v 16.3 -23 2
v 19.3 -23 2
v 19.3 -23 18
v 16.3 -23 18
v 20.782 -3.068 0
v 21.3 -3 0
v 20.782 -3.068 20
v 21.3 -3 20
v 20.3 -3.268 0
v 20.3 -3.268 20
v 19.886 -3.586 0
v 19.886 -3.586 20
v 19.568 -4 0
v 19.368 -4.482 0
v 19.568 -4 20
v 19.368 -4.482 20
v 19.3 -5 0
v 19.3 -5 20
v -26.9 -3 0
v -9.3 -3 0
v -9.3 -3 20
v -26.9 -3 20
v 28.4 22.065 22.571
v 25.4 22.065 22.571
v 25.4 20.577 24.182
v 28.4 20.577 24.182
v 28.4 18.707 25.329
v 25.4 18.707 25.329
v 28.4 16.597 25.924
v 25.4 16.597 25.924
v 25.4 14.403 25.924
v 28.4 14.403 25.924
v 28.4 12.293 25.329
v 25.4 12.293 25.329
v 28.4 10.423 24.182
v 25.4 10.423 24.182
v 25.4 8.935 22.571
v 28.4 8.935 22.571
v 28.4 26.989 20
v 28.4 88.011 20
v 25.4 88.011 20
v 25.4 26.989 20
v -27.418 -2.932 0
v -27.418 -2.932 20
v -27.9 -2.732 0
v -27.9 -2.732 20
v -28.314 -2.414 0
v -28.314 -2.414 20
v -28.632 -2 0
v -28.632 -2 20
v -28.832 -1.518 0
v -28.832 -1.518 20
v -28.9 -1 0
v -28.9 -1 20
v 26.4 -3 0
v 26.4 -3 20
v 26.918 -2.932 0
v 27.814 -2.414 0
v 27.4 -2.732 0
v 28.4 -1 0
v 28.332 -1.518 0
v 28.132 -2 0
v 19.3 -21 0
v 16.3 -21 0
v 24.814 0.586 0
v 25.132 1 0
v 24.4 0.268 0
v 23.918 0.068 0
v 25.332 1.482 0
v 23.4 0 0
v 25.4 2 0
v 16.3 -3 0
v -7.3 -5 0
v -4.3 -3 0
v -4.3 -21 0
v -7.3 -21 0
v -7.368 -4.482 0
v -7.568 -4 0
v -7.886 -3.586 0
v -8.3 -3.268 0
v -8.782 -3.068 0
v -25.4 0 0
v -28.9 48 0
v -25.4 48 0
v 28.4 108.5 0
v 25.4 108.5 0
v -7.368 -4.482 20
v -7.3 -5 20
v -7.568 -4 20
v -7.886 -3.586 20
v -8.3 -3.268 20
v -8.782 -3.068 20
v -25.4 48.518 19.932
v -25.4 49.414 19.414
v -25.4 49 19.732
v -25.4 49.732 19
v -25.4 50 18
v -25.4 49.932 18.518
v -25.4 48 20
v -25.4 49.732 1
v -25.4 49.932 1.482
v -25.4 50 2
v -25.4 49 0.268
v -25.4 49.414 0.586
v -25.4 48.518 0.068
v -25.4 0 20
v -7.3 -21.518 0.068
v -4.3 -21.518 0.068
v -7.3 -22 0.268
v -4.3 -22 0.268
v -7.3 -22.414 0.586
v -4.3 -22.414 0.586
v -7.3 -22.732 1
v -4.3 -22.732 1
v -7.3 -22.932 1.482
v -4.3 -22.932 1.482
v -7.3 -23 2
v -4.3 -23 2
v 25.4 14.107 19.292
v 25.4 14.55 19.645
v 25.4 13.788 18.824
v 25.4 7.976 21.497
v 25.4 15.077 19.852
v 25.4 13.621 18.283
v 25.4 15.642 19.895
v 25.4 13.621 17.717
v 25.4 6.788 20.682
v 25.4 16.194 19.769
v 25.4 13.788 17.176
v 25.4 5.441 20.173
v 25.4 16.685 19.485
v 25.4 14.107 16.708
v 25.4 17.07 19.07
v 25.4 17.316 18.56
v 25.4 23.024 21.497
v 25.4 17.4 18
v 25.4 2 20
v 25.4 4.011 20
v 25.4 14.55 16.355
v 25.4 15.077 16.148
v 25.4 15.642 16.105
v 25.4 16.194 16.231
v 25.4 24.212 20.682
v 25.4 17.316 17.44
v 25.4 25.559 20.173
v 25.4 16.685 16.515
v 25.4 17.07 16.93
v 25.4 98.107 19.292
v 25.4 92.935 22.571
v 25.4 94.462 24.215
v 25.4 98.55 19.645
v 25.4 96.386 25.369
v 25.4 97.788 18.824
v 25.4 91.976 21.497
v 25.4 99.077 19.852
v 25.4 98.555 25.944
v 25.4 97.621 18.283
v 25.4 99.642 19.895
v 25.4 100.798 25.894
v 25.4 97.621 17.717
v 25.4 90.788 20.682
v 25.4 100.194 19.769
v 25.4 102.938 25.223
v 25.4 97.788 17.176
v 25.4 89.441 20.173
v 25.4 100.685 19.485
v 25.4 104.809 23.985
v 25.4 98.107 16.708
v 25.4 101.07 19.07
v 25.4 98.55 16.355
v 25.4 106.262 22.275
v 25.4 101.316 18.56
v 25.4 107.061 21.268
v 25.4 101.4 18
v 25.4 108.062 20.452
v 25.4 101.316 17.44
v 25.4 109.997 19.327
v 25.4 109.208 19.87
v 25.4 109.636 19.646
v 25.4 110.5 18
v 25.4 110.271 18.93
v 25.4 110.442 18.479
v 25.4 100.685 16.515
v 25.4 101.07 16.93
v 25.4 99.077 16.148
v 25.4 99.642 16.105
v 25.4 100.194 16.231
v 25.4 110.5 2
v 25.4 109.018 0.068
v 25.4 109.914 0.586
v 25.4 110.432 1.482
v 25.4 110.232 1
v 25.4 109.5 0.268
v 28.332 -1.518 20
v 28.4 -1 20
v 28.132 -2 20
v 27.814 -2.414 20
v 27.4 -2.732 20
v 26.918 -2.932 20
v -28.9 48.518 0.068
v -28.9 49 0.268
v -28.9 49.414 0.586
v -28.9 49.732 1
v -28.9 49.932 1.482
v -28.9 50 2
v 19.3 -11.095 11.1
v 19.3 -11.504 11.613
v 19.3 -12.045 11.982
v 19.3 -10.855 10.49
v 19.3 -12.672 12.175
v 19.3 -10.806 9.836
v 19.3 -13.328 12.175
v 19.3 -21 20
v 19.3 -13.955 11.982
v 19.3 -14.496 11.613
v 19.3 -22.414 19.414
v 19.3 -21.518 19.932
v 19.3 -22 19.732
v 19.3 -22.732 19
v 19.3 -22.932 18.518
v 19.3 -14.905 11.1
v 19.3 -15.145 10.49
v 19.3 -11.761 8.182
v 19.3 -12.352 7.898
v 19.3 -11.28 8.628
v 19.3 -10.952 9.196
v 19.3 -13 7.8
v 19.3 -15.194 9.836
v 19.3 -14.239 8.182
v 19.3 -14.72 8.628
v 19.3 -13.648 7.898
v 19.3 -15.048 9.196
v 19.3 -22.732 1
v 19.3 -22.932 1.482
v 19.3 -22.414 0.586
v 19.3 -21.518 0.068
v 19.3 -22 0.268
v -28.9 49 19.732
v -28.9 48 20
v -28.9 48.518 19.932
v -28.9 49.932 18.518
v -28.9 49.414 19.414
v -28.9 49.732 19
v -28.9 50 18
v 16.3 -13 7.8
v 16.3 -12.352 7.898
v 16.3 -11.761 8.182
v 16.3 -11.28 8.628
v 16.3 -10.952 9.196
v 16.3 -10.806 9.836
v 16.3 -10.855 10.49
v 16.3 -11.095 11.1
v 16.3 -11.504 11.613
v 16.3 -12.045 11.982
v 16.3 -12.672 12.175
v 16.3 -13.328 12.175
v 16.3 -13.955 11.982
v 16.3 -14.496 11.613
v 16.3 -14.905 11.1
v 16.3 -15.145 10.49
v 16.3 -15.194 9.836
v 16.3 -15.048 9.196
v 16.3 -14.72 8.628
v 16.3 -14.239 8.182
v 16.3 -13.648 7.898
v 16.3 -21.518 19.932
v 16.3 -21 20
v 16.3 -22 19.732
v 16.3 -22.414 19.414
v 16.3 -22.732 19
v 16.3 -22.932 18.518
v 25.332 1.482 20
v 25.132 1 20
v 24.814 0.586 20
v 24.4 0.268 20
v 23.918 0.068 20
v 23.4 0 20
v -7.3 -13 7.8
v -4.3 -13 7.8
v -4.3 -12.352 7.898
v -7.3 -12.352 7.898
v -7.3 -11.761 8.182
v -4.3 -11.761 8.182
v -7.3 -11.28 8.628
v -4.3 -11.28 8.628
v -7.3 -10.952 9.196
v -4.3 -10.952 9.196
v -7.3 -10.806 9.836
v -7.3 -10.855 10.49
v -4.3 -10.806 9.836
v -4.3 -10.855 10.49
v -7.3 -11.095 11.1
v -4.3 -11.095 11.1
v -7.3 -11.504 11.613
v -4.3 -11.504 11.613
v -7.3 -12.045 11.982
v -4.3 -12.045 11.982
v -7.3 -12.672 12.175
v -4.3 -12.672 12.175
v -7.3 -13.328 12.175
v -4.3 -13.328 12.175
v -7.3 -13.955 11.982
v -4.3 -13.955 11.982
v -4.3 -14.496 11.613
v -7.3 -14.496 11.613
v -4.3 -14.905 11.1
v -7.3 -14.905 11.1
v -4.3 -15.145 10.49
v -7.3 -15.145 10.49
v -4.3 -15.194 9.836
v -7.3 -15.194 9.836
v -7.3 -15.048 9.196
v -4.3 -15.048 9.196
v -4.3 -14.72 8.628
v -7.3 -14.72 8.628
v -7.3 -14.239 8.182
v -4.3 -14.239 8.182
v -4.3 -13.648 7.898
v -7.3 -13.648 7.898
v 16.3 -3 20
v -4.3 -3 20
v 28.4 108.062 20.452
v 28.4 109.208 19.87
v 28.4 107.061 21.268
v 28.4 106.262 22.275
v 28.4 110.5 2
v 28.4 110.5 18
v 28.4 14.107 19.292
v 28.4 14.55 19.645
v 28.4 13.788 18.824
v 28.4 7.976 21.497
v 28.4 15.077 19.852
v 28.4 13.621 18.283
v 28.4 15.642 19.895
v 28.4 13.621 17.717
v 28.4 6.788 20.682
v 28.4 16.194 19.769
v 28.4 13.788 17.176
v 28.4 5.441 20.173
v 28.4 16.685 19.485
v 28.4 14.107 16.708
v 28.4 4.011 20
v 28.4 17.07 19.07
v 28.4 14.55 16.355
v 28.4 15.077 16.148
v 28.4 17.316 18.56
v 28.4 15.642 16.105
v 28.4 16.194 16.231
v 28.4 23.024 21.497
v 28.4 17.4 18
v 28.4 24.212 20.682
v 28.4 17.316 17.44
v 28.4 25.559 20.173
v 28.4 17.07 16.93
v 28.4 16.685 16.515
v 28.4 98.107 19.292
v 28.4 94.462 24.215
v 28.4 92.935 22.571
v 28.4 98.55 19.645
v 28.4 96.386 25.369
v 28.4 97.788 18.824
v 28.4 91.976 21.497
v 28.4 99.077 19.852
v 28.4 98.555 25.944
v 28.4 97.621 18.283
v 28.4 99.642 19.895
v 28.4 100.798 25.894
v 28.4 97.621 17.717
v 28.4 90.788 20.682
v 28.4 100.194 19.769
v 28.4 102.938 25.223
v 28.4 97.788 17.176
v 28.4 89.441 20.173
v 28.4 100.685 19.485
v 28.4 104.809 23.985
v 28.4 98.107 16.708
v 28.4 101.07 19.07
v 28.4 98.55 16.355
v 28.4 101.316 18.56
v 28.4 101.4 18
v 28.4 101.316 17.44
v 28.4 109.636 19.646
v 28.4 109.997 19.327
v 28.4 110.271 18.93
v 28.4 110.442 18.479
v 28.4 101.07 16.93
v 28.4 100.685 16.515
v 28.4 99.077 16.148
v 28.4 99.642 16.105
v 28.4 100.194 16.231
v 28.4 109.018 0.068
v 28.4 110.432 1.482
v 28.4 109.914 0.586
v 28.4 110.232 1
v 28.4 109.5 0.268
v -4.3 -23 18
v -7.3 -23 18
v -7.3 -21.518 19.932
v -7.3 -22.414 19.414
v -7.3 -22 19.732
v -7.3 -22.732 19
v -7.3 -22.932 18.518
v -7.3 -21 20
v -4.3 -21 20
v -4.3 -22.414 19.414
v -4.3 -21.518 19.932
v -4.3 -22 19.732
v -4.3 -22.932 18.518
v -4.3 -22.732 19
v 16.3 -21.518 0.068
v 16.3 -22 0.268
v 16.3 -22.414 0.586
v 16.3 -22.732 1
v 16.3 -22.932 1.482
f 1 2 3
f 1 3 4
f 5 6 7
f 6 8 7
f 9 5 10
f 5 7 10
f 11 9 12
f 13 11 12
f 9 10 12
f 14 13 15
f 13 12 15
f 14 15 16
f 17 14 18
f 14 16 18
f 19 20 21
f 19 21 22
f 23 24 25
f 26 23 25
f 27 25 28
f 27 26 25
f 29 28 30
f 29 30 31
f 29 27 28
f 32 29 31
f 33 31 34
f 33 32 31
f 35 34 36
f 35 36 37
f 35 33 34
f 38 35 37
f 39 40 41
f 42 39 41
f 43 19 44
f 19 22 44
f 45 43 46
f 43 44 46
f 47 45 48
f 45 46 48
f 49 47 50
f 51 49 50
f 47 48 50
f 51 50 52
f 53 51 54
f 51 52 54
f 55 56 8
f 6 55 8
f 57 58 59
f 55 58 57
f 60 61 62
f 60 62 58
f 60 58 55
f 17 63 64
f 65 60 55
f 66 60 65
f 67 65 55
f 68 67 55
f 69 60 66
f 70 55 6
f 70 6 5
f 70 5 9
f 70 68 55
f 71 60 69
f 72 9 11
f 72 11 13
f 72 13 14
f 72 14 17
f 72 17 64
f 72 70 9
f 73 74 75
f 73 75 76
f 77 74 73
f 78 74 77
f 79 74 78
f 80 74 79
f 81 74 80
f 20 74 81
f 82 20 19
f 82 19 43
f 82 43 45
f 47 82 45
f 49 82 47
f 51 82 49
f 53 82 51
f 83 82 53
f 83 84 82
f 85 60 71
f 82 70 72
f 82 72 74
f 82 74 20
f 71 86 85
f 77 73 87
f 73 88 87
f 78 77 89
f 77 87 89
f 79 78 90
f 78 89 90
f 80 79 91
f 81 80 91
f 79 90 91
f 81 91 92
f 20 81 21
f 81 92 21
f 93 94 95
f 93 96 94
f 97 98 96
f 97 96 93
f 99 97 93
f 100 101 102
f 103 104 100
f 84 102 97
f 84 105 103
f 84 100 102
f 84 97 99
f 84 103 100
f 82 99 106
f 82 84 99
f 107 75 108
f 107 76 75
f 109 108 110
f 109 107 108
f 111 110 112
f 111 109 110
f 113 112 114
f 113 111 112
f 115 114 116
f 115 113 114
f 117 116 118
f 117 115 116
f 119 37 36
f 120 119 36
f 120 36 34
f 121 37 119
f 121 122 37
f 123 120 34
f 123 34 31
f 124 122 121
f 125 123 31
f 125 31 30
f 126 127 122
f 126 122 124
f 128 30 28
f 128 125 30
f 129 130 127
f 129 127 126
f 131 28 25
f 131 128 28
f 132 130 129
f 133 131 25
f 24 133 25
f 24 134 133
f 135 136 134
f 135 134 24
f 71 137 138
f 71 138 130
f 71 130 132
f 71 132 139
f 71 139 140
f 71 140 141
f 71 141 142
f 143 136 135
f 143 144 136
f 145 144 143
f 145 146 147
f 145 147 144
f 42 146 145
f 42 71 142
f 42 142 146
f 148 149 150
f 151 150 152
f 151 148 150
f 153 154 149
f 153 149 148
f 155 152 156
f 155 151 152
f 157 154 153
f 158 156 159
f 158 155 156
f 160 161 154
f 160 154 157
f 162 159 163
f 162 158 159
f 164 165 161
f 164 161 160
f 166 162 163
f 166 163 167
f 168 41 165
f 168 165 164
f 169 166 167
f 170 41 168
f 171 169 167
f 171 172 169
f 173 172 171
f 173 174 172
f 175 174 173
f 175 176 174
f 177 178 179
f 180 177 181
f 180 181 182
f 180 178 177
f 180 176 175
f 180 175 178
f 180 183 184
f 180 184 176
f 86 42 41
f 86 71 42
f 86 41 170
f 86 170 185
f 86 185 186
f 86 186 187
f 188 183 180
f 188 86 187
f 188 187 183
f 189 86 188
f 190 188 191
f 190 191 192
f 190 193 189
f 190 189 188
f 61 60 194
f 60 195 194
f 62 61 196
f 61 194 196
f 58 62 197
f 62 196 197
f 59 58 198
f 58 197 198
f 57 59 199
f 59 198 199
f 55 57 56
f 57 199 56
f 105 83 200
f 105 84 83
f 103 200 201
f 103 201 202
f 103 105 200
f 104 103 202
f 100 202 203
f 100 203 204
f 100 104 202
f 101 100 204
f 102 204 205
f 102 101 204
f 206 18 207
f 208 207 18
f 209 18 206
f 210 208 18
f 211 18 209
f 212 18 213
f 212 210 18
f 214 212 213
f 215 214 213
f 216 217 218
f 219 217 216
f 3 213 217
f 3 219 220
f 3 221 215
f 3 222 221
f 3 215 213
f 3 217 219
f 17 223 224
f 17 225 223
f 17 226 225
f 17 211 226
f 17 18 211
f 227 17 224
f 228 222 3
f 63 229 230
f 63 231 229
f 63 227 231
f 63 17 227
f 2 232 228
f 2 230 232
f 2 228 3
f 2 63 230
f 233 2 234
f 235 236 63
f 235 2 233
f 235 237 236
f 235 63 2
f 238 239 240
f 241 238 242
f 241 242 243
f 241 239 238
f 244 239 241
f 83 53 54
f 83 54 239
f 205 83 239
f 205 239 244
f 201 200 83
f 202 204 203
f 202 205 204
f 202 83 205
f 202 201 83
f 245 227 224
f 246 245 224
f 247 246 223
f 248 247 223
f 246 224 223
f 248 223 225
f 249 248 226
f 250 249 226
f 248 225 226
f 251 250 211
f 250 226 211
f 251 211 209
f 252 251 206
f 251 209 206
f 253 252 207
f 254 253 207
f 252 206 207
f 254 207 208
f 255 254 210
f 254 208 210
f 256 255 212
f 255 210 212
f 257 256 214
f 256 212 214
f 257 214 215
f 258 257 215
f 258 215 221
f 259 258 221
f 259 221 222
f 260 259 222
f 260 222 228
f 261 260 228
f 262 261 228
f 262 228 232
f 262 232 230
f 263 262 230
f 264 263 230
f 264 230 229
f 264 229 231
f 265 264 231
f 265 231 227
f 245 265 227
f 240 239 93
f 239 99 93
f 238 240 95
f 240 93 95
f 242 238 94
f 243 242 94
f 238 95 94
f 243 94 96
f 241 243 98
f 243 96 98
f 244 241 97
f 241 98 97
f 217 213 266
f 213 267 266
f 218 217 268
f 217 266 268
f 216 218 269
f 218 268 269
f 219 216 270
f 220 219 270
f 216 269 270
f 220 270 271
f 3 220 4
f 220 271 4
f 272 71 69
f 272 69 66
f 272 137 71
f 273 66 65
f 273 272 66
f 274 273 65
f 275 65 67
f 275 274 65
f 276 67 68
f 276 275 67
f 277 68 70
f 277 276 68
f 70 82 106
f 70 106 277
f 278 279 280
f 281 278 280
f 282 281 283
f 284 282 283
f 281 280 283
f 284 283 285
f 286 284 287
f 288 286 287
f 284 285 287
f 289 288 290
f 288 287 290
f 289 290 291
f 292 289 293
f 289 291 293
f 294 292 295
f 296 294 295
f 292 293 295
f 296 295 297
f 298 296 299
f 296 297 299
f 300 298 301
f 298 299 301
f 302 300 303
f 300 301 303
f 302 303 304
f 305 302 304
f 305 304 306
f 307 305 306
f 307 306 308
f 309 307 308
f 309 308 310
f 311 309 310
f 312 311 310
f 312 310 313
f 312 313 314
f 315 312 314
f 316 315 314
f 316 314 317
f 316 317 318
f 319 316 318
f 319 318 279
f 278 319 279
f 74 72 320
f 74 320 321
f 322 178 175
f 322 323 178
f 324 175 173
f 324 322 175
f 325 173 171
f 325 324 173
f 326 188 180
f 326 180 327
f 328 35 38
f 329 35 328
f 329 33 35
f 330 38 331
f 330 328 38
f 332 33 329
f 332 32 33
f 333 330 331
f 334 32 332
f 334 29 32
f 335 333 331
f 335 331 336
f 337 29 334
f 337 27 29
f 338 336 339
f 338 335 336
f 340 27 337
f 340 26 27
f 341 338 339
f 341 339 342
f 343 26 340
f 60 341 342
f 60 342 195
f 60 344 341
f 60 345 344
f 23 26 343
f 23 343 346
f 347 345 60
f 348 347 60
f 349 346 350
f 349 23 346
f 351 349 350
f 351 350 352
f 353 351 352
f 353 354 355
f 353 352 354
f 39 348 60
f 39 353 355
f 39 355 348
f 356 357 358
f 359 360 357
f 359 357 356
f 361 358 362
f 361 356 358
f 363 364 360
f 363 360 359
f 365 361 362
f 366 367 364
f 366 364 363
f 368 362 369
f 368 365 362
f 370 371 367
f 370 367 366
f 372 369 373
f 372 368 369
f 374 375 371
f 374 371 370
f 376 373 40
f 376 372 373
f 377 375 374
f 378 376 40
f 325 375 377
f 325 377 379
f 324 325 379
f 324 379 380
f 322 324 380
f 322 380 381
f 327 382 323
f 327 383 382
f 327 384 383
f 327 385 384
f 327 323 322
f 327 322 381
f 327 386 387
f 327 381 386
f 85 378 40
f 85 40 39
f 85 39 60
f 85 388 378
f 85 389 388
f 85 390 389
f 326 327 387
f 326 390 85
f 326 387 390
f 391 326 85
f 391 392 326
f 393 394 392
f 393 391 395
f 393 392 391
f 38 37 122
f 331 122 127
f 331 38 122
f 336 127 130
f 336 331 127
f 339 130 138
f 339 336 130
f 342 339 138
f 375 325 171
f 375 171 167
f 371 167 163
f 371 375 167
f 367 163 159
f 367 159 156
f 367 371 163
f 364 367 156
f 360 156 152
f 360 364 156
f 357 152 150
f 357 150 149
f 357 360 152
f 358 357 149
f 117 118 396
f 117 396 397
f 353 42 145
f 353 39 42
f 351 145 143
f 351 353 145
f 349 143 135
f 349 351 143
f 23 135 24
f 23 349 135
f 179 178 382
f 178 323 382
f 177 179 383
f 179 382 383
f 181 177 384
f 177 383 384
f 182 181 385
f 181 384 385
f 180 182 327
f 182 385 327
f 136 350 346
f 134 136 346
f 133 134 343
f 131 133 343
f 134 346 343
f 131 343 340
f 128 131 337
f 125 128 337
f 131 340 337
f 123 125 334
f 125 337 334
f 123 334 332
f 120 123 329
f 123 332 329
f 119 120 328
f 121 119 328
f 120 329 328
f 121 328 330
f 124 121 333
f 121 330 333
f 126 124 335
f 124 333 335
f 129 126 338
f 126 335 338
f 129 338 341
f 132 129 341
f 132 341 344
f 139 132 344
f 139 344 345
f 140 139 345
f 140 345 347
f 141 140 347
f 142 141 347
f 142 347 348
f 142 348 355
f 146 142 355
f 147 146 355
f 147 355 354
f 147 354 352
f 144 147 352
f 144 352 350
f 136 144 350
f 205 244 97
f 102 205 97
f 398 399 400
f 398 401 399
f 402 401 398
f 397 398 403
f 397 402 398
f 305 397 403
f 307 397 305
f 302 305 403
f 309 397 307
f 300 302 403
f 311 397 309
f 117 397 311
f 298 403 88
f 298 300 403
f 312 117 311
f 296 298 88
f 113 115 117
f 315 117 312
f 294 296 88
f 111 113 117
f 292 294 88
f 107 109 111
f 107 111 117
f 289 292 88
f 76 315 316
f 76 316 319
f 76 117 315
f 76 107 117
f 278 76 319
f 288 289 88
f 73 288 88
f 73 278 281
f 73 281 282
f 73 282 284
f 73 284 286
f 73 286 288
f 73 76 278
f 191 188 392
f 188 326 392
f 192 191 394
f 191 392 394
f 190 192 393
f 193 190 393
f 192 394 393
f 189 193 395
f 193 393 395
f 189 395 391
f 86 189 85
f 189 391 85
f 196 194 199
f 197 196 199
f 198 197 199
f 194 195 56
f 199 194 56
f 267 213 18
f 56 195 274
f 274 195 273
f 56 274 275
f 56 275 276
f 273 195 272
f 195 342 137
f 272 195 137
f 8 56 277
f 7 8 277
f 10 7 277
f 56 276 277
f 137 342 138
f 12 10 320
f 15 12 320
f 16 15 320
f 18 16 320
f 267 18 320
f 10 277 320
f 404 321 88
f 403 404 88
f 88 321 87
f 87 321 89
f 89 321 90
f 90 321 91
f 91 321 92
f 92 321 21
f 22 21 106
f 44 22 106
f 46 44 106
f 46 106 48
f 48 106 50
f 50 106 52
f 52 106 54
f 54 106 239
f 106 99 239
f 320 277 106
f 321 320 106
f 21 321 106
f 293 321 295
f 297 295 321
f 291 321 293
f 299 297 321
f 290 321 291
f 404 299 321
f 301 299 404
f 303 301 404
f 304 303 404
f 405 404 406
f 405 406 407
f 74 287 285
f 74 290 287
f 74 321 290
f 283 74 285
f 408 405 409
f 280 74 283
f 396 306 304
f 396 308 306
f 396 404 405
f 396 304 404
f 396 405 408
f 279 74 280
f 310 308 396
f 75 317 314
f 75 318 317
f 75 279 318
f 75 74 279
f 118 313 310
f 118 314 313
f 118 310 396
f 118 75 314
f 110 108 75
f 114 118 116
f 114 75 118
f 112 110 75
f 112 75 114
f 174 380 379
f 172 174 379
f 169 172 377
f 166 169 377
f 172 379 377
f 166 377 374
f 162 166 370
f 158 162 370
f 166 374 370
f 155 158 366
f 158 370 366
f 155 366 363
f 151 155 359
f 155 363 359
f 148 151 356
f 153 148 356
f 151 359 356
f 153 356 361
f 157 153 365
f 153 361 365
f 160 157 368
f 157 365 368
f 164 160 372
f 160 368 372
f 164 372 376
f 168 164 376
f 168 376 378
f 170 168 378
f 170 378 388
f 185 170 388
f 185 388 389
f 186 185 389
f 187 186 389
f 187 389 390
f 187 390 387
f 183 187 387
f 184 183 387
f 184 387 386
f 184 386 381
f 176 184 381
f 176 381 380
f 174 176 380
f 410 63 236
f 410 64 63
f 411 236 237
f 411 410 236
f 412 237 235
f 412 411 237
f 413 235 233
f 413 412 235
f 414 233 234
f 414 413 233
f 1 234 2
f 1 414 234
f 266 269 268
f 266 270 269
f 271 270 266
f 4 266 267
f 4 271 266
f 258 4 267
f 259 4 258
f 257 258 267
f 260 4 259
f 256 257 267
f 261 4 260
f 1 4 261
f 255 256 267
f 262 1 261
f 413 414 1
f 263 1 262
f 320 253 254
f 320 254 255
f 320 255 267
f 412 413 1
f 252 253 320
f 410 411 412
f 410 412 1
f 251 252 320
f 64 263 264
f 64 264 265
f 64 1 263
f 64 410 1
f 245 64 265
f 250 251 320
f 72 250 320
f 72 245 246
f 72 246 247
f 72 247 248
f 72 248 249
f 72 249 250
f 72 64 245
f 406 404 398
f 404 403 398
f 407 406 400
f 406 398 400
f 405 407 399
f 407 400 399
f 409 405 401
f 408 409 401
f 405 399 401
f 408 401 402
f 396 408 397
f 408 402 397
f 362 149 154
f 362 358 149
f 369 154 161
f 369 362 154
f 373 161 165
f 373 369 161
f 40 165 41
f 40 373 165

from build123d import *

# Parameters (mm, degrees)
BOSS_EXTRUDE1_DEPTH = 20
SKETCH2_R           = 2.2
CUT_EXTRUDE1_DEPTH  = 123.202659546
SKETCH3_R           = 8
BOSS_EXTRUDE2_DEPTH = 3
CUT_EXTRUDE2_REACH  = 129.16
SKETCH4_R           = 1.9
FILLET1_R           = 2
FILLET2_R           = 6


with BuildPart() as part:
    # Sketch1 → Boss-Extrude1 (new body)
    with BuildSketch(Plane.XY):
        Polygon((-25.4, 0), (25.4, 0), (25.4, 110.5), (28.4, 110.5), (28.4, -3), (19.3, -3), (19.3, -23), (16.3, -23), (16.3, -3), (-4.3, -3), (-4.3, -23), (-7.3, -23), (-7.3, -3), (-28.9, -3), (-28.9, 50), (-25.4, 50), align=None)
    extrude(amount=BOSS_EXTRUDE1_DEPTH)

    # Sketch2 → Cut-Extrude1 (cut, through all)
    with BuildSketch(Plane(origin=(19.3, 0, 0), x_dir=(0, 0, -1), z_dir=(1, 0, 0))):
        with Locations((-10, -13)):
            Circle(SKETCH2_R)
    extrude(amount=-CUT_EXTRUDE1_DEPTH, mode=Mode.SUBTRACT)

    # Sketch3 → Boss-Extrude2 (add)
    with BuildSketch(Plane(origin=(28.4, 0, 0), x_dir=(0, 0, -1), z_dir=(1, 0, 0))):
        with Locations((-18, 99.5)):
            Circle(SKETCH3_R)
        with Locations((-18, 15.5)):
            Circle(SKETCH3_R)
    extrude(amount=-BOSS_EXTRUDE2_DEPTH)

    # Sketch4 → Cut-Extrude2 (cut, up to next)
    with BuildSketch(Plane(origin=(28.4, 0, 0), x_dir=(0, 0, -1), z_dir=(1, 0, 0)), mode=Mode.PRIVATE) as cut_extrude2_sk1:
        with Locations(Location((-18, 99.5, 0), (0, 0, 90))):
            Circle(SKETCH4_R)
    cut_extrude2_tool1 = extrude(cut_extrude2_sk1.sketch, amount=-CUT_EXTRUDE2_REACH, mode=Mode.PRIVATE) & part.part
    # Sketch4 → Cut-Extrude2 (cut, up to next)
    with BuildSketch(Plane(origin=(28.4, 0, 0), x_dir=(0, 0, -1), z_dir=(1, 0, 0)), mode=Mode.PRIVATE) as cut_extrude2_sk2:
        with Locations(Location((-18, 15.5, 0), (0, 0, 90))):
            Circle(SKETCH4_R)
    cut_extrude2_tool2 = extrude(cut_extrude2_sk2.sketch, amount=-CUT_EXTRUDE2_REACH, mode=Mode.PRIVATE) & part.part
    add(cut_extrude2_tool1.solids().sort_by_distance((28.4, 99.5, 18))[0], mode=Mode.SUBTRACT)
    add(cut_extrude2_tool2.solids().sort_by_distance((28.4, 15.5, 18))[0], mode=Mode.SUBTRACT)

    # Fillet1
    fillet1_edges = [part.edges().sort_by_distance(p)[0] for p in [
        (26.9, 110.5, 0),
        (17.8, -23, 0),
        (-5.8, -23, 0),
        (-5.8, -23, 20),
        (-27.15, 50, 0),
        (25.4, 0, 10),
        (28.4, -3, 10),
        (19.3, -3, 10),
        (-7.3, -3, 10),
        (-28.9, -3, 10),
        (17.8, -23, 20),
        (26.9, 110.5, 20),
        (-27.15, 50, 20),
    ]]
    fillet(fillet1_edges, radius=FILLET1_R)

    # Fillet2
    fillet2_edges = [part.edges().sort_by_distance(p)[0] for p in [
        (26.9, 91.754033308, 20),
        (26.9, 107.245966692, 20),
        (26.9, 7.754033308, 20),
        (26.9, 23.245966692, 20),
    ]]
    fillet(fillet2_edges, radius=FILLET2_R)


solid = part.part
